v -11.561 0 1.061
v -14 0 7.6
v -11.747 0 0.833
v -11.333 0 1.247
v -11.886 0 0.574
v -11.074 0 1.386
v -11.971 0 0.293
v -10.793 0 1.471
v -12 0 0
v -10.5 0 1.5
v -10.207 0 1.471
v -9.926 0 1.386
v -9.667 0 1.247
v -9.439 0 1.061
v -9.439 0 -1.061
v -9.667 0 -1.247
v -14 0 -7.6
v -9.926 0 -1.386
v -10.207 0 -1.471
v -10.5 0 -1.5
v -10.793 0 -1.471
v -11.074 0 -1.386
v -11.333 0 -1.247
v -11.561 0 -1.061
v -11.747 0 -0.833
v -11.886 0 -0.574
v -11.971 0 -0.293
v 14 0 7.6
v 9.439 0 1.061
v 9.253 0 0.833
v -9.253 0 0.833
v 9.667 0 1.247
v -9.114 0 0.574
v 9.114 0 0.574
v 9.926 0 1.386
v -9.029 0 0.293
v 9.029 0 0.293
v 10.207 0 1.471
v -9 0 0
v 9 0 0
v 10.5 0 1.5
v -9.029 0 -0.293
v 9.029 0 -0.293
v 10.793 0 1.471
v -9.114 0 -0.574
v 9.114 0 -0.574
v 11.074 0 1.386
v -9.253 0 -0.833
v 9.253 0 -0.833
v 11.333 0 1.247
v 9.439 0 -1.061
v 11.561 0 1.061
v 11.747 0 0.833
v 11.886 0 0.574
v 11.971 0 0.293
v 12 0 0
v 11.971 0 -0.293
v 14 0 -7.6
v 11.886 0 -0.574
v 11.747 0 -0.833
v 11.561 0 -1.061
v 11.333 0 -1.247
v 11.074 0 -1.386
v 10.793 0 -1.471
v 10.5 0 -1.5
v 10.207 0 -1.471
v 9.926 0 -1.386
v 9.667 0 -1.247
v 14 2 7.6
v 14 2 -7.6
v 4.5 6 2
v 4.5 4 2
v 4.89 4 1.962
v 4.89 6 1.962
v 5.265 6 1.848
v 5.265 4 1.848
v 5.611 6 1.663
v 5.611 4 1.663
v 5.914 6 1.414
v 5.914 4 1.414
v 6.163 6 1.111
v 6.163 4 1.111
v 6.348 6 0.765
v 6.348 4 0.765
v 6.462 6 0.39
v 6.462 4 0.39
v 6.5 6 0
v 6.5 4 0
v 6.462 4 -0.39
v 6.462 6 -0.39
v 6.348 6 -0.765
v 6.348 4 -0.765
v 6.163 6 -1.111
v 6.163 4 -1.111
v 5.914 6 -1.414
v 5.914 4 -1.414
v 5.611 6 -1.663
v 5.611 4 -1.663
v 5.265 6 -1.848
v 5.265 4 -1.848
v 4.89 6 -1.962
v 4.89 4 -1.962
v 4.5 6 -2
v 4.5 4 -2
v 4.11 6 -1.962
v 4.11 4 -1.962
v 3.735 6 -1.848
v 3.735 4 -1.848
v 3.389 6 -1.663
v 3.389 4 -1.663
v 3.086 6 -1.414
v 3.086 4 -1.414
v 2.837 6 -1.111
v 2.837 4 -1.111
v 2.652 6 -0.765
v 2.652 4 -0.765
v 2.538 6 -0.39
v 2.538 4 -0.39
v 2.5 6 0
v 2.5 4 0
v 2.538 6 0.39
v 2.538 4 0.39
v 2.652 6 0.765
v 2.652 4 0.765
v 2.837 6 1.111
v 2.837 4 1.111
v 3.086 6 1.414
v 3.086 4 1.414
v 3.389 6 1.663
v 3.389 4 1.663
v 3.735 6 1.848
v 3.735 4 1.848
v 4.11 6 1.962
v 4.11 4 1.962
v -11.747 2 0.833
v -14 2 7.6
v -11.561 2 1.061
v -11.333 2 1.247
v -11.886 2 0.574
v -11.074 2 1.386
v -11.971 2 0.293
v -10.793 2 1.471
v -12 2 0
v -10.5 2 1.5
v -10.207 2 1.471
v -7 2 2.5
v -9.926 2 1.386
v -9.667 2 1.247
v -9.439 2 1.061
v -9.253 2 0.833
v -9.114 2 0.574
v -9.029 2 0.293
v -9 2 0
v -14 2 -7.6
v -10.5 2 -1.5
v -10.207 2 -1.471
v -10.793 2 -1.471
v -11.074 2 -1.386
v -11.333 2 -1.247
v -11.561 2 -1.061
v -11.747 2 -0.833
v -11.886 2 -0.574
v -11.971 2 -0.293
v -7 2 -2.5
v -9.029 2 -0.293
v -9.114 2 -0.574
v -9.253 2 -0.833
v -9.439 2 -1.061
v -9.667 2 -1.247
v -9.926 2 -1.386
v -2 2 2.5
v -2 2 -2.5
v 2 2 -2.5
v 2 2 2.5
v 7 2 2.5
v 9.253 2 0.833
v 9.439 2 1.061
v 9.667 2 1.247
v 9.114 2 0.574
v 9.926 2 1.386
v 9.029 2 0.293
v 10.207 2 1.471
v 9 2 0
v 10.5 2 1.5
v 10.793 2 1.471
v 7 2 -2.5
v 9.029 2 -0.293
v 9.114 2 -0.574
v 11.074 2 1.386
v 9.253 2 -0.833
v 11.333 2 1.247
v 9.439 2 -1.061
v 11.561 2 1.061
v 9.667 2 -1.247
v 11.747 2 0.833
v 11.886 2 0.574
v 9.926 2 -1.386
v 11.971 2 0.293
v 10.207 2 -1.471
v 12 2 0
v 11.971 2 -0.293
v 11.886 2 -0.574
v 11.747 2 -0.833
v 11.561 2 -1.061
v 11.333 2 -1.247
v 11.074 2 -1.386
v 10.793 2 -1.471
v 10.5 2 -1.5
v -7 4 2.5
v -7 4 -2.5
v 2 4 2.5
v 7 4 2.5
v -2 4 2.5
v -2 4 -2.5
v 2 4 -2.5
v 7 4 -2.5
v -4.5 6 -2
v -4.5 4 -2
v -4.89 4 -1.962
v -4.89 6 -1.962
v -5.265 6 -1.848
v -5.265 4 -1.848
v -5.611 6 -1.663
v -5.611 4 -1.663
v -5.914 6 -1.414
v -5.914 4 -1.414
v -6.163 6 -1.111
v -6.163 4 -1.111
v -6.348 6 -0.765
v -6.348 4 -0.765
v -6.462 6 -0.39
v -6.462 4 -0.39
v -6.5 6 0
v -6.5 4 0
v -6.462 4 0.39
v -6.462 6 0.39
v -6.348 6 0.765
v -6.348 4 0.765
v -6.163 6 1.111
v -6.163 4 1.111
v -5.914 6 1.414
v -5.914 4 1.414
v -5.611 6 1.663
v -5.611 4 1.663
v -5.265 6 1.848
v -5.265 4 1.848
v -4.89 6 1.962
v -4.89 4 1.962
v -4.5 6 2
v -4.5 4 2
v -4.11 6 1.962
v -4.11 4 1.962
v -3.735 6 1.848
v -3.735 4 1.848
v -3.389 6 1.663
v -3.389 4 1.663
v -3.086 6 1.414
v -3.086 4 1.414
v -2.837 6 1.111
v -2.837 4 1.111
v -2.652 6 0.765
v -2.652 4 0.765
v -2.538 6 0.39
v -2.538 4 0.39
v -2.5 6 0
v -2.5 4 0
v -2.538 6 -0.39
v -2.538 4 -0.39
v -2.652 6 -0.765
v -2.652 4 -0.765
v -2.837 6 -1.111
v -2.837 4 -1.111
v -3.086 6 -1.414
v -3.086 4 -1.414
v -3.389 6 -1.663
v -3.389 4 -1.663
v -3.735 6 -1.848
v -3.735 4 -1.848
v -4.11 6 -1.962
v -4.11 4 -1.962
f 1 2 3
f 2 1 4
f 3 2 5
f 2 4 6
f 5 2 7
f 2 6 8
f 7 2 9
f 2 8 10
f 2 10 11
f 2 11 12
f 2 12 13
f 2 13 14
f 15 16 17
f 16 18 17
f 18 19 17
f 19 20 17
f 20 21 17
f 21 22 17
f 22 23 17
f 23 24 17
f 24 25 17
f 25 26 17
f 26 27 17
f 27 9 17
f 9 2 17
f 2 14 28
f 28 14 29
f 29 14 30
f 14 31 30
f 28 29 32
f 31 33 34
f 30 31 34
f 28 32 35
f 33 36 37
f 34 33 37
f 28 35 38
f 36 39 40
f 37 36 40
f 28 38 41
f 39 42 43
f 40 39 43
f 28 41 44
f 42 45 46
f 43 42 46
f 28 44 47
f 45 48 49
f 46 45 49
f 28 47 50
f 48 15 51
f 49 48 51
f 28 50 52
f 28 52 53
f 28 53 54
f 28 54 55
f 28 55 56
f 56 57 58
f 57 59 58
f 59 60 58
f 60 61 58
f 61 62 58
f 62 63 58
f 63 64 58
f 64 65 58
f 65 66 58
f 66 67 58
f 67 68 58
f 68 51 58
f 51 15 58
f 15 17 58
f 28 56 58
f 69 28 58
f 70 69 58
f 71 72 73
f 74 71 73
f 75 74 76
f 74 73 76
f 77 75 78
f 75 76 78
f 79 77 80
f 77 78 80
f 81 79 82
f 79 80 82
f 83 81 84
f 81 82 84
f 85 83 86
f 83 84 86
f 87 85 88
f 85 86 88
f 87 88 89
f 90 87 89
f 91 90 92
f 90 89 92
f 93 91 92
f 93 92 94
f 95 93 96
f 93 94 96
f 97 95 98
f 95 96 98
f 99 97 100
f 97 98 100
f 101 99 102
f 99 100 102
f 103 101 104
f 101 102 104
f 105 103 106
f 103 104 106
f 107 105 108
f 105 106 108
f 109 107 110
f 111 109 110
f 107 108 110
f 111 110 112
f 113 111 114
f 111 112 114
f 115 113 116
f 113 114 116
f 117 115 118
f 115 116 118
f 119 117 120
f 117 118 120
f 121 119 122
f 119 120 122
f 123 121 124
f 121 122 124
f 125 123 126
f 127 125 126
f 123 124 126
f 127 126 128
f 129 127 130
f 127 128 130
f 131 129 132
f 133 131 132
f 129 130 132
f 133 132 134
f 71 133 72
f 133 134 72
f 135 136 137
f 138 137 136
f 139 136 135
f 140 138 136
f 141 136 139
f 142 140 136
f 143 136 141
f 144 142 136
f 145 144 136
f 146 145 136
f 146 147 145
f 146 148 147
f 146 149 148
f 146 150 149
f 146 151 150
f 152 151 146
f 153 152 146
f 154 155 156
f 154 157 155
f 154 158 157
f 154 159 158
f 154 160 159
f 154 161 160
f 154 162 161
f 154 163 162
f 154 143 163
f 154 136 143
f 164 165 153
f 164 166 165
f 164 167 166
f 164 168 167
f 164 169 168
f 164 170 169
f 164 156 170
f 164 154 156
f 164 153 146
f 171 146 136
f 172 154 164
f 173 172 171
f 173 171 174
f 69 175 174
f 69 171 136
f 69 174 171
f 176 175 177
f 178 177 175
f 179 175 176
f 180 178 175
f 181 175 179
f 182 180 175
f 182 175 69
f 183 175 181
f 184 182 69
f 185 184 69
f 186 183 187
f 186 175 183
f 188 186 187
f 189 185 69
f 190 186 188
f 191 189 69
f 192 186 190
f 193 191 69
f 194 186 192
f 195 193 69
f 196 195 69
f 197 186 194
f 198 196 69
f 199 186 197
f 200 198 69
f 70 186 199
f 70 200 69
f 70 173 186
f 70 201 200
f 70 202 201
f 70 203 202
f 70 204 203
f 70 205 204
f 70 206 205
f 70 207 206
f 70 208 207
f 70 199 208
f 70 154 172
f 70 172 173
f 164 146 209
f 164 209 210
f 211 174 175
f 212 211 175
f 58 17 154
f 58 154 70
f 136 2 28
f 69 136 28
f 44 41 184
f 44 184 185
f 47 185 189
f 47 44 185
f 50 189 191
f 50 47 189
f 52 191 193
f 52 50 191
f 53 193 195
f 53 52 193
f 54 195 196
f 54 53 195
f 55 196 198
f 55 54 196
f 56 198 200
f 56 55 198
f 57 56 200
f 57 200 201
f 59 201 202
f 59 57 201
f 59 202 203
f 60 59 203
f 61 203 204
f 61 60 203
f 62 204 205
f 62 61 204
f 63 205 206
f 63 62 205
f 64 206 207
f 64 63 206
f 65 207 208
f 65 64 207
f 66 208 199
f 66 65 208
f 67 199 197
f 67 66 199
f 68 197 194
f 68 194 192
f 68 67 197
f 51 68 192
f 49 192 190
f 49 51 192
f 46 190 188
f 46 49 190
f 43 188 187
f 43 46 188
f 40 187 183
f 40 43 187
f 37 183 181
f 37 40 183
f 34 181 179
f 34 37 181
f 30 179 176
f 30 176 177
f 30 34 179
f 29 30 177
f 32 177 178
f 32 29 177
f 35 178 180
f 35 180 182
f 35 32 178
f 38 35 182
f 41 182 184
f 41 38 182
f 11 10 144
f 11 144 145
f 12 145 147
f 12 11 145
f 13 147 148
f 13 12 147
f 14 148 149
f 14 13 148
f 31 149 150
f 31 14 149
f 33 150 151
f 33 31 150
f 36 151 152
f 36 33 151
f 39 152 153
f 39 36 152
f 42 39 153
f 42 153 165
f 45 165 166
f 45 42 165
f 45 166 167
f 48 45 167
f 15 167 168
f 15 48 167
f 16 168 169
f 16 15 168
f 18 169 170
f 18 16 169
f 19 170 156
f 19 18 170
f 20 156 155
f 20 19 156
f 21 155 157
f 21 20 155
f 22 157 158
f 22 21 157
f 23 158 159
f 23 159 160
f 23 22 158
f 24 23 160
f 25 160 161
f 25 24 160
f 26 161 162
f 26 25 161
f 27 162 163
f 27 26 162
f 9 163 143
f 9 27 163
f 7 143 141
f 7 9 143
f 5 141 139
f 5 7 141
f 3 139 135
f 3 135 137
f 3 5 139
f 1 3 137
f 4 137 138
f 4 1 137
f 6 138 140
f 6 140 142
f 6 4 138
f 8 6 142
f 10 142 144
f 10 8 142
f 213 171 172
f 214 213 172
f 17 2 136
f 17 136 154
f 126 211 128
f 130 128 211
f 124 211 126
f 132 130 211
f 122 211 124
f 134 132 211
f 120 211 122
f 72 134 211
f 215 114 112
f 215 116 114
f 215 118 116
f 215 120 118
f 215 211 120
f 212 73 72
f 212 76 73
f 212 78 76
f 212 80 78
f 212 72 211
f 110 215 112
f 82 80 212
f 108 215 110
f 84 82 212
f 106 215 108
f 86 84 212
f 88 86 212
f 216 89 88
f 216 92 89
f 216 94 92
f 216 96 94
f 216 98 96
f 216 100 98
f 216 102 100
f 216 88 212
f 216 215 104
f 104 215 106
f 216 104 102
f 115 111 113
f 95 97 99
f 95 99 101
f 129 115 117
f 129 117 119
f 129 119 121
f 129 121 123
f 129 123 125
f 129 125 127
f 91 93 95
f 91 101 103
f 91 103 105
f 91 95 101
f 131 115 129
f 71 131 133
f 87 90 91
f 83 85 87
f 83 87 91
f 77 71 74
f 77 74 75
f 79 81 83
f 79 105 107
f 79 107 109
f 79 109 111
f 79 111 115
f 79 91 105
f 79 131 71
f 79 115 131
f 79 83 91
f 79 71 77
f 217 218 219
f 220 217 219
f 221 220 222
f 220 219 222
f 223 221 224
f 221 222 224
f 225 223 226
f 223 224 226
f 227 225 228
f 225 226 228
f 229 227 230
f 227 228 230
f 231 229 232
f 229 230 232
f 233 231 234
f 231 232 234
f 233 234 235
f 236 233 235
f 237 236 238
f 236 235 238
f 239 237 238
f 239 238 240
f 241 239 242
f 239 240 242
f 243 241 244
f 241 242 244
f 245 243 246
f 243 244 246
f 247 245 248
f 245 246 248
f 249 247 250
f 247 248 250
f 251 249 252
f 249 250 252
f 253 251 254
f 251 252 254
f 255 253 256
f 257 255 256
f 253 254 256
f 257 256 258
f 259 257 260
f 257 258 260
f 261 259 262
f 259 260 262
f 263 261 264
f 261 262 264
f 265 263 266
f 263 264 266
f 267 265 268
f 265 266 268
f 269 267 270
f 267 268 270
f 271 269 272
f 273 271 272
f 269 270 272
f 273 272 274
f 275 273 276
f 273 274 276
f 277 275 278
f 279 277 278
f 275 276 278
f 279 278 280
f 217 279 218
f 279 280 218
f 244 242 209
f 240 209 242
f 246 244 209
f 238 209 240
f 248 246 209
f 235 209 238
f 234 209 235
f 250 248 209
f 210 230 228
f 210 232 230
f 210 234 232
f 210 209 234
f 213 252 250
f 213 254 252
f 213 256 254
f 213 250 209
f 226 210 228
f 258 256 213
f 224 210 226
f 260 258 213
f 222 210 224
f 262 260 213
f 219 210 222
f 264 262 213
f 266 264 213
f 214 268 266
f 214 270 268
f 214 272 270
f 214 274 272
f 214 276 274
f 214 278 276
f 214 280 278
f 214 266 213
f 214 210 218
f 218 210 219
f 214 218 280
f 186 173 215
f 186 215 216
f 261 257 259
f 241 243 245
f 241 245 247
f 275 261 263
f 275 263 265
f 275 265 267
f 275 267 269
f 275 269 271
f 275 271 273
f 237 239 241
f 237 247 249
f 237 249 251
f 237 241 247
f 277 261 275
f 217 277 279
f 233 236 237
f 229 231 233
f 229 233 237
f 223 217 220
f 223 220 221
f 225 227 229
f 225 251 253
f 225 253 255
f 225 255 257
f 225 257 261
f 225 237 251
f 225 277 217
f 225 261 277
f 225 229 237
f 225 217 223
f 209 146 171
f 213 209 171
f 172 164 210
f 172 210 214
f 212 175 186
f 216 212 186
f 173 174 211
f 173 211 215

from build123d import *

# Parameters (mm, degrees)
SKETCH_1_W      = 28
SKETCH_1_H      = 15.2
SKETCH_1_R      = 1.5
EXTRUDE_1_DEPTH = 2
SKETCH_2_W      = 5
SKETCH_2_H      = 5
EXTRUDE_2_DEPTH = 2
SKETCH_3_R      = 2
EXTRUDE_3_DEPTH = 2


with BuildPart() as part:
    # 草图1 → 凸台-拉伸1 (new body)
    with BuildSketch(Plane(origin=(0, 0, 0), x_dir=(1, 0, 0), z_dir=(0, 1, 0))):
        Rectangle(SKETCH_1_W, SKETCH_1_H)
        with Locations(Location((10.5, 0, 0), (0, 0, 270))):
            Circle(SKETCH_1_R, mode=Mode.SUBTRACT)
        with Locations(Location((-10.5, 0, 0), (0, 0, 270))):
            Circle(SKETCH_1_R, mode=Mode.SUBTRACT)
    extrude(amount=EXTRUDE_1_DEPTH)

    # 草图2 → 凸台-拉伸2 (add)
    with BuildSketch(Plane(origin=(0, 2, 0), x_dir=(1, 0, 0), z_dir=(0, 1, 0))):
        with Locations((4.5, 0)):
            Rectangle(SKETCH_2_W, SKETCH_2_H)
        with Locations((-4.5, 0)):
            Rectangle(SKETCH_2_W, SKETCH_2_H)
    extrude(amount=EXTRUDE_2_DEPTH)

    # 草图3 → 凸台-拉伸3 (add)
    with BuildSketch(Plane(origin=(0, 4, 0), x_dir=(1, 0, 0), z_dir=(0, 1, 0))):
        with Locations(Location((4.5, 0, 0), (0, 0, 270))):
            Circle(SKETCH_3_R)
        with Locations(Location((-4.5, 0, 0), (0, 0, 90))):
            Circle(SKETCH_3_R)
    extrude(amount=EXTRUDE_3_DEPTH)


solid = part.part
